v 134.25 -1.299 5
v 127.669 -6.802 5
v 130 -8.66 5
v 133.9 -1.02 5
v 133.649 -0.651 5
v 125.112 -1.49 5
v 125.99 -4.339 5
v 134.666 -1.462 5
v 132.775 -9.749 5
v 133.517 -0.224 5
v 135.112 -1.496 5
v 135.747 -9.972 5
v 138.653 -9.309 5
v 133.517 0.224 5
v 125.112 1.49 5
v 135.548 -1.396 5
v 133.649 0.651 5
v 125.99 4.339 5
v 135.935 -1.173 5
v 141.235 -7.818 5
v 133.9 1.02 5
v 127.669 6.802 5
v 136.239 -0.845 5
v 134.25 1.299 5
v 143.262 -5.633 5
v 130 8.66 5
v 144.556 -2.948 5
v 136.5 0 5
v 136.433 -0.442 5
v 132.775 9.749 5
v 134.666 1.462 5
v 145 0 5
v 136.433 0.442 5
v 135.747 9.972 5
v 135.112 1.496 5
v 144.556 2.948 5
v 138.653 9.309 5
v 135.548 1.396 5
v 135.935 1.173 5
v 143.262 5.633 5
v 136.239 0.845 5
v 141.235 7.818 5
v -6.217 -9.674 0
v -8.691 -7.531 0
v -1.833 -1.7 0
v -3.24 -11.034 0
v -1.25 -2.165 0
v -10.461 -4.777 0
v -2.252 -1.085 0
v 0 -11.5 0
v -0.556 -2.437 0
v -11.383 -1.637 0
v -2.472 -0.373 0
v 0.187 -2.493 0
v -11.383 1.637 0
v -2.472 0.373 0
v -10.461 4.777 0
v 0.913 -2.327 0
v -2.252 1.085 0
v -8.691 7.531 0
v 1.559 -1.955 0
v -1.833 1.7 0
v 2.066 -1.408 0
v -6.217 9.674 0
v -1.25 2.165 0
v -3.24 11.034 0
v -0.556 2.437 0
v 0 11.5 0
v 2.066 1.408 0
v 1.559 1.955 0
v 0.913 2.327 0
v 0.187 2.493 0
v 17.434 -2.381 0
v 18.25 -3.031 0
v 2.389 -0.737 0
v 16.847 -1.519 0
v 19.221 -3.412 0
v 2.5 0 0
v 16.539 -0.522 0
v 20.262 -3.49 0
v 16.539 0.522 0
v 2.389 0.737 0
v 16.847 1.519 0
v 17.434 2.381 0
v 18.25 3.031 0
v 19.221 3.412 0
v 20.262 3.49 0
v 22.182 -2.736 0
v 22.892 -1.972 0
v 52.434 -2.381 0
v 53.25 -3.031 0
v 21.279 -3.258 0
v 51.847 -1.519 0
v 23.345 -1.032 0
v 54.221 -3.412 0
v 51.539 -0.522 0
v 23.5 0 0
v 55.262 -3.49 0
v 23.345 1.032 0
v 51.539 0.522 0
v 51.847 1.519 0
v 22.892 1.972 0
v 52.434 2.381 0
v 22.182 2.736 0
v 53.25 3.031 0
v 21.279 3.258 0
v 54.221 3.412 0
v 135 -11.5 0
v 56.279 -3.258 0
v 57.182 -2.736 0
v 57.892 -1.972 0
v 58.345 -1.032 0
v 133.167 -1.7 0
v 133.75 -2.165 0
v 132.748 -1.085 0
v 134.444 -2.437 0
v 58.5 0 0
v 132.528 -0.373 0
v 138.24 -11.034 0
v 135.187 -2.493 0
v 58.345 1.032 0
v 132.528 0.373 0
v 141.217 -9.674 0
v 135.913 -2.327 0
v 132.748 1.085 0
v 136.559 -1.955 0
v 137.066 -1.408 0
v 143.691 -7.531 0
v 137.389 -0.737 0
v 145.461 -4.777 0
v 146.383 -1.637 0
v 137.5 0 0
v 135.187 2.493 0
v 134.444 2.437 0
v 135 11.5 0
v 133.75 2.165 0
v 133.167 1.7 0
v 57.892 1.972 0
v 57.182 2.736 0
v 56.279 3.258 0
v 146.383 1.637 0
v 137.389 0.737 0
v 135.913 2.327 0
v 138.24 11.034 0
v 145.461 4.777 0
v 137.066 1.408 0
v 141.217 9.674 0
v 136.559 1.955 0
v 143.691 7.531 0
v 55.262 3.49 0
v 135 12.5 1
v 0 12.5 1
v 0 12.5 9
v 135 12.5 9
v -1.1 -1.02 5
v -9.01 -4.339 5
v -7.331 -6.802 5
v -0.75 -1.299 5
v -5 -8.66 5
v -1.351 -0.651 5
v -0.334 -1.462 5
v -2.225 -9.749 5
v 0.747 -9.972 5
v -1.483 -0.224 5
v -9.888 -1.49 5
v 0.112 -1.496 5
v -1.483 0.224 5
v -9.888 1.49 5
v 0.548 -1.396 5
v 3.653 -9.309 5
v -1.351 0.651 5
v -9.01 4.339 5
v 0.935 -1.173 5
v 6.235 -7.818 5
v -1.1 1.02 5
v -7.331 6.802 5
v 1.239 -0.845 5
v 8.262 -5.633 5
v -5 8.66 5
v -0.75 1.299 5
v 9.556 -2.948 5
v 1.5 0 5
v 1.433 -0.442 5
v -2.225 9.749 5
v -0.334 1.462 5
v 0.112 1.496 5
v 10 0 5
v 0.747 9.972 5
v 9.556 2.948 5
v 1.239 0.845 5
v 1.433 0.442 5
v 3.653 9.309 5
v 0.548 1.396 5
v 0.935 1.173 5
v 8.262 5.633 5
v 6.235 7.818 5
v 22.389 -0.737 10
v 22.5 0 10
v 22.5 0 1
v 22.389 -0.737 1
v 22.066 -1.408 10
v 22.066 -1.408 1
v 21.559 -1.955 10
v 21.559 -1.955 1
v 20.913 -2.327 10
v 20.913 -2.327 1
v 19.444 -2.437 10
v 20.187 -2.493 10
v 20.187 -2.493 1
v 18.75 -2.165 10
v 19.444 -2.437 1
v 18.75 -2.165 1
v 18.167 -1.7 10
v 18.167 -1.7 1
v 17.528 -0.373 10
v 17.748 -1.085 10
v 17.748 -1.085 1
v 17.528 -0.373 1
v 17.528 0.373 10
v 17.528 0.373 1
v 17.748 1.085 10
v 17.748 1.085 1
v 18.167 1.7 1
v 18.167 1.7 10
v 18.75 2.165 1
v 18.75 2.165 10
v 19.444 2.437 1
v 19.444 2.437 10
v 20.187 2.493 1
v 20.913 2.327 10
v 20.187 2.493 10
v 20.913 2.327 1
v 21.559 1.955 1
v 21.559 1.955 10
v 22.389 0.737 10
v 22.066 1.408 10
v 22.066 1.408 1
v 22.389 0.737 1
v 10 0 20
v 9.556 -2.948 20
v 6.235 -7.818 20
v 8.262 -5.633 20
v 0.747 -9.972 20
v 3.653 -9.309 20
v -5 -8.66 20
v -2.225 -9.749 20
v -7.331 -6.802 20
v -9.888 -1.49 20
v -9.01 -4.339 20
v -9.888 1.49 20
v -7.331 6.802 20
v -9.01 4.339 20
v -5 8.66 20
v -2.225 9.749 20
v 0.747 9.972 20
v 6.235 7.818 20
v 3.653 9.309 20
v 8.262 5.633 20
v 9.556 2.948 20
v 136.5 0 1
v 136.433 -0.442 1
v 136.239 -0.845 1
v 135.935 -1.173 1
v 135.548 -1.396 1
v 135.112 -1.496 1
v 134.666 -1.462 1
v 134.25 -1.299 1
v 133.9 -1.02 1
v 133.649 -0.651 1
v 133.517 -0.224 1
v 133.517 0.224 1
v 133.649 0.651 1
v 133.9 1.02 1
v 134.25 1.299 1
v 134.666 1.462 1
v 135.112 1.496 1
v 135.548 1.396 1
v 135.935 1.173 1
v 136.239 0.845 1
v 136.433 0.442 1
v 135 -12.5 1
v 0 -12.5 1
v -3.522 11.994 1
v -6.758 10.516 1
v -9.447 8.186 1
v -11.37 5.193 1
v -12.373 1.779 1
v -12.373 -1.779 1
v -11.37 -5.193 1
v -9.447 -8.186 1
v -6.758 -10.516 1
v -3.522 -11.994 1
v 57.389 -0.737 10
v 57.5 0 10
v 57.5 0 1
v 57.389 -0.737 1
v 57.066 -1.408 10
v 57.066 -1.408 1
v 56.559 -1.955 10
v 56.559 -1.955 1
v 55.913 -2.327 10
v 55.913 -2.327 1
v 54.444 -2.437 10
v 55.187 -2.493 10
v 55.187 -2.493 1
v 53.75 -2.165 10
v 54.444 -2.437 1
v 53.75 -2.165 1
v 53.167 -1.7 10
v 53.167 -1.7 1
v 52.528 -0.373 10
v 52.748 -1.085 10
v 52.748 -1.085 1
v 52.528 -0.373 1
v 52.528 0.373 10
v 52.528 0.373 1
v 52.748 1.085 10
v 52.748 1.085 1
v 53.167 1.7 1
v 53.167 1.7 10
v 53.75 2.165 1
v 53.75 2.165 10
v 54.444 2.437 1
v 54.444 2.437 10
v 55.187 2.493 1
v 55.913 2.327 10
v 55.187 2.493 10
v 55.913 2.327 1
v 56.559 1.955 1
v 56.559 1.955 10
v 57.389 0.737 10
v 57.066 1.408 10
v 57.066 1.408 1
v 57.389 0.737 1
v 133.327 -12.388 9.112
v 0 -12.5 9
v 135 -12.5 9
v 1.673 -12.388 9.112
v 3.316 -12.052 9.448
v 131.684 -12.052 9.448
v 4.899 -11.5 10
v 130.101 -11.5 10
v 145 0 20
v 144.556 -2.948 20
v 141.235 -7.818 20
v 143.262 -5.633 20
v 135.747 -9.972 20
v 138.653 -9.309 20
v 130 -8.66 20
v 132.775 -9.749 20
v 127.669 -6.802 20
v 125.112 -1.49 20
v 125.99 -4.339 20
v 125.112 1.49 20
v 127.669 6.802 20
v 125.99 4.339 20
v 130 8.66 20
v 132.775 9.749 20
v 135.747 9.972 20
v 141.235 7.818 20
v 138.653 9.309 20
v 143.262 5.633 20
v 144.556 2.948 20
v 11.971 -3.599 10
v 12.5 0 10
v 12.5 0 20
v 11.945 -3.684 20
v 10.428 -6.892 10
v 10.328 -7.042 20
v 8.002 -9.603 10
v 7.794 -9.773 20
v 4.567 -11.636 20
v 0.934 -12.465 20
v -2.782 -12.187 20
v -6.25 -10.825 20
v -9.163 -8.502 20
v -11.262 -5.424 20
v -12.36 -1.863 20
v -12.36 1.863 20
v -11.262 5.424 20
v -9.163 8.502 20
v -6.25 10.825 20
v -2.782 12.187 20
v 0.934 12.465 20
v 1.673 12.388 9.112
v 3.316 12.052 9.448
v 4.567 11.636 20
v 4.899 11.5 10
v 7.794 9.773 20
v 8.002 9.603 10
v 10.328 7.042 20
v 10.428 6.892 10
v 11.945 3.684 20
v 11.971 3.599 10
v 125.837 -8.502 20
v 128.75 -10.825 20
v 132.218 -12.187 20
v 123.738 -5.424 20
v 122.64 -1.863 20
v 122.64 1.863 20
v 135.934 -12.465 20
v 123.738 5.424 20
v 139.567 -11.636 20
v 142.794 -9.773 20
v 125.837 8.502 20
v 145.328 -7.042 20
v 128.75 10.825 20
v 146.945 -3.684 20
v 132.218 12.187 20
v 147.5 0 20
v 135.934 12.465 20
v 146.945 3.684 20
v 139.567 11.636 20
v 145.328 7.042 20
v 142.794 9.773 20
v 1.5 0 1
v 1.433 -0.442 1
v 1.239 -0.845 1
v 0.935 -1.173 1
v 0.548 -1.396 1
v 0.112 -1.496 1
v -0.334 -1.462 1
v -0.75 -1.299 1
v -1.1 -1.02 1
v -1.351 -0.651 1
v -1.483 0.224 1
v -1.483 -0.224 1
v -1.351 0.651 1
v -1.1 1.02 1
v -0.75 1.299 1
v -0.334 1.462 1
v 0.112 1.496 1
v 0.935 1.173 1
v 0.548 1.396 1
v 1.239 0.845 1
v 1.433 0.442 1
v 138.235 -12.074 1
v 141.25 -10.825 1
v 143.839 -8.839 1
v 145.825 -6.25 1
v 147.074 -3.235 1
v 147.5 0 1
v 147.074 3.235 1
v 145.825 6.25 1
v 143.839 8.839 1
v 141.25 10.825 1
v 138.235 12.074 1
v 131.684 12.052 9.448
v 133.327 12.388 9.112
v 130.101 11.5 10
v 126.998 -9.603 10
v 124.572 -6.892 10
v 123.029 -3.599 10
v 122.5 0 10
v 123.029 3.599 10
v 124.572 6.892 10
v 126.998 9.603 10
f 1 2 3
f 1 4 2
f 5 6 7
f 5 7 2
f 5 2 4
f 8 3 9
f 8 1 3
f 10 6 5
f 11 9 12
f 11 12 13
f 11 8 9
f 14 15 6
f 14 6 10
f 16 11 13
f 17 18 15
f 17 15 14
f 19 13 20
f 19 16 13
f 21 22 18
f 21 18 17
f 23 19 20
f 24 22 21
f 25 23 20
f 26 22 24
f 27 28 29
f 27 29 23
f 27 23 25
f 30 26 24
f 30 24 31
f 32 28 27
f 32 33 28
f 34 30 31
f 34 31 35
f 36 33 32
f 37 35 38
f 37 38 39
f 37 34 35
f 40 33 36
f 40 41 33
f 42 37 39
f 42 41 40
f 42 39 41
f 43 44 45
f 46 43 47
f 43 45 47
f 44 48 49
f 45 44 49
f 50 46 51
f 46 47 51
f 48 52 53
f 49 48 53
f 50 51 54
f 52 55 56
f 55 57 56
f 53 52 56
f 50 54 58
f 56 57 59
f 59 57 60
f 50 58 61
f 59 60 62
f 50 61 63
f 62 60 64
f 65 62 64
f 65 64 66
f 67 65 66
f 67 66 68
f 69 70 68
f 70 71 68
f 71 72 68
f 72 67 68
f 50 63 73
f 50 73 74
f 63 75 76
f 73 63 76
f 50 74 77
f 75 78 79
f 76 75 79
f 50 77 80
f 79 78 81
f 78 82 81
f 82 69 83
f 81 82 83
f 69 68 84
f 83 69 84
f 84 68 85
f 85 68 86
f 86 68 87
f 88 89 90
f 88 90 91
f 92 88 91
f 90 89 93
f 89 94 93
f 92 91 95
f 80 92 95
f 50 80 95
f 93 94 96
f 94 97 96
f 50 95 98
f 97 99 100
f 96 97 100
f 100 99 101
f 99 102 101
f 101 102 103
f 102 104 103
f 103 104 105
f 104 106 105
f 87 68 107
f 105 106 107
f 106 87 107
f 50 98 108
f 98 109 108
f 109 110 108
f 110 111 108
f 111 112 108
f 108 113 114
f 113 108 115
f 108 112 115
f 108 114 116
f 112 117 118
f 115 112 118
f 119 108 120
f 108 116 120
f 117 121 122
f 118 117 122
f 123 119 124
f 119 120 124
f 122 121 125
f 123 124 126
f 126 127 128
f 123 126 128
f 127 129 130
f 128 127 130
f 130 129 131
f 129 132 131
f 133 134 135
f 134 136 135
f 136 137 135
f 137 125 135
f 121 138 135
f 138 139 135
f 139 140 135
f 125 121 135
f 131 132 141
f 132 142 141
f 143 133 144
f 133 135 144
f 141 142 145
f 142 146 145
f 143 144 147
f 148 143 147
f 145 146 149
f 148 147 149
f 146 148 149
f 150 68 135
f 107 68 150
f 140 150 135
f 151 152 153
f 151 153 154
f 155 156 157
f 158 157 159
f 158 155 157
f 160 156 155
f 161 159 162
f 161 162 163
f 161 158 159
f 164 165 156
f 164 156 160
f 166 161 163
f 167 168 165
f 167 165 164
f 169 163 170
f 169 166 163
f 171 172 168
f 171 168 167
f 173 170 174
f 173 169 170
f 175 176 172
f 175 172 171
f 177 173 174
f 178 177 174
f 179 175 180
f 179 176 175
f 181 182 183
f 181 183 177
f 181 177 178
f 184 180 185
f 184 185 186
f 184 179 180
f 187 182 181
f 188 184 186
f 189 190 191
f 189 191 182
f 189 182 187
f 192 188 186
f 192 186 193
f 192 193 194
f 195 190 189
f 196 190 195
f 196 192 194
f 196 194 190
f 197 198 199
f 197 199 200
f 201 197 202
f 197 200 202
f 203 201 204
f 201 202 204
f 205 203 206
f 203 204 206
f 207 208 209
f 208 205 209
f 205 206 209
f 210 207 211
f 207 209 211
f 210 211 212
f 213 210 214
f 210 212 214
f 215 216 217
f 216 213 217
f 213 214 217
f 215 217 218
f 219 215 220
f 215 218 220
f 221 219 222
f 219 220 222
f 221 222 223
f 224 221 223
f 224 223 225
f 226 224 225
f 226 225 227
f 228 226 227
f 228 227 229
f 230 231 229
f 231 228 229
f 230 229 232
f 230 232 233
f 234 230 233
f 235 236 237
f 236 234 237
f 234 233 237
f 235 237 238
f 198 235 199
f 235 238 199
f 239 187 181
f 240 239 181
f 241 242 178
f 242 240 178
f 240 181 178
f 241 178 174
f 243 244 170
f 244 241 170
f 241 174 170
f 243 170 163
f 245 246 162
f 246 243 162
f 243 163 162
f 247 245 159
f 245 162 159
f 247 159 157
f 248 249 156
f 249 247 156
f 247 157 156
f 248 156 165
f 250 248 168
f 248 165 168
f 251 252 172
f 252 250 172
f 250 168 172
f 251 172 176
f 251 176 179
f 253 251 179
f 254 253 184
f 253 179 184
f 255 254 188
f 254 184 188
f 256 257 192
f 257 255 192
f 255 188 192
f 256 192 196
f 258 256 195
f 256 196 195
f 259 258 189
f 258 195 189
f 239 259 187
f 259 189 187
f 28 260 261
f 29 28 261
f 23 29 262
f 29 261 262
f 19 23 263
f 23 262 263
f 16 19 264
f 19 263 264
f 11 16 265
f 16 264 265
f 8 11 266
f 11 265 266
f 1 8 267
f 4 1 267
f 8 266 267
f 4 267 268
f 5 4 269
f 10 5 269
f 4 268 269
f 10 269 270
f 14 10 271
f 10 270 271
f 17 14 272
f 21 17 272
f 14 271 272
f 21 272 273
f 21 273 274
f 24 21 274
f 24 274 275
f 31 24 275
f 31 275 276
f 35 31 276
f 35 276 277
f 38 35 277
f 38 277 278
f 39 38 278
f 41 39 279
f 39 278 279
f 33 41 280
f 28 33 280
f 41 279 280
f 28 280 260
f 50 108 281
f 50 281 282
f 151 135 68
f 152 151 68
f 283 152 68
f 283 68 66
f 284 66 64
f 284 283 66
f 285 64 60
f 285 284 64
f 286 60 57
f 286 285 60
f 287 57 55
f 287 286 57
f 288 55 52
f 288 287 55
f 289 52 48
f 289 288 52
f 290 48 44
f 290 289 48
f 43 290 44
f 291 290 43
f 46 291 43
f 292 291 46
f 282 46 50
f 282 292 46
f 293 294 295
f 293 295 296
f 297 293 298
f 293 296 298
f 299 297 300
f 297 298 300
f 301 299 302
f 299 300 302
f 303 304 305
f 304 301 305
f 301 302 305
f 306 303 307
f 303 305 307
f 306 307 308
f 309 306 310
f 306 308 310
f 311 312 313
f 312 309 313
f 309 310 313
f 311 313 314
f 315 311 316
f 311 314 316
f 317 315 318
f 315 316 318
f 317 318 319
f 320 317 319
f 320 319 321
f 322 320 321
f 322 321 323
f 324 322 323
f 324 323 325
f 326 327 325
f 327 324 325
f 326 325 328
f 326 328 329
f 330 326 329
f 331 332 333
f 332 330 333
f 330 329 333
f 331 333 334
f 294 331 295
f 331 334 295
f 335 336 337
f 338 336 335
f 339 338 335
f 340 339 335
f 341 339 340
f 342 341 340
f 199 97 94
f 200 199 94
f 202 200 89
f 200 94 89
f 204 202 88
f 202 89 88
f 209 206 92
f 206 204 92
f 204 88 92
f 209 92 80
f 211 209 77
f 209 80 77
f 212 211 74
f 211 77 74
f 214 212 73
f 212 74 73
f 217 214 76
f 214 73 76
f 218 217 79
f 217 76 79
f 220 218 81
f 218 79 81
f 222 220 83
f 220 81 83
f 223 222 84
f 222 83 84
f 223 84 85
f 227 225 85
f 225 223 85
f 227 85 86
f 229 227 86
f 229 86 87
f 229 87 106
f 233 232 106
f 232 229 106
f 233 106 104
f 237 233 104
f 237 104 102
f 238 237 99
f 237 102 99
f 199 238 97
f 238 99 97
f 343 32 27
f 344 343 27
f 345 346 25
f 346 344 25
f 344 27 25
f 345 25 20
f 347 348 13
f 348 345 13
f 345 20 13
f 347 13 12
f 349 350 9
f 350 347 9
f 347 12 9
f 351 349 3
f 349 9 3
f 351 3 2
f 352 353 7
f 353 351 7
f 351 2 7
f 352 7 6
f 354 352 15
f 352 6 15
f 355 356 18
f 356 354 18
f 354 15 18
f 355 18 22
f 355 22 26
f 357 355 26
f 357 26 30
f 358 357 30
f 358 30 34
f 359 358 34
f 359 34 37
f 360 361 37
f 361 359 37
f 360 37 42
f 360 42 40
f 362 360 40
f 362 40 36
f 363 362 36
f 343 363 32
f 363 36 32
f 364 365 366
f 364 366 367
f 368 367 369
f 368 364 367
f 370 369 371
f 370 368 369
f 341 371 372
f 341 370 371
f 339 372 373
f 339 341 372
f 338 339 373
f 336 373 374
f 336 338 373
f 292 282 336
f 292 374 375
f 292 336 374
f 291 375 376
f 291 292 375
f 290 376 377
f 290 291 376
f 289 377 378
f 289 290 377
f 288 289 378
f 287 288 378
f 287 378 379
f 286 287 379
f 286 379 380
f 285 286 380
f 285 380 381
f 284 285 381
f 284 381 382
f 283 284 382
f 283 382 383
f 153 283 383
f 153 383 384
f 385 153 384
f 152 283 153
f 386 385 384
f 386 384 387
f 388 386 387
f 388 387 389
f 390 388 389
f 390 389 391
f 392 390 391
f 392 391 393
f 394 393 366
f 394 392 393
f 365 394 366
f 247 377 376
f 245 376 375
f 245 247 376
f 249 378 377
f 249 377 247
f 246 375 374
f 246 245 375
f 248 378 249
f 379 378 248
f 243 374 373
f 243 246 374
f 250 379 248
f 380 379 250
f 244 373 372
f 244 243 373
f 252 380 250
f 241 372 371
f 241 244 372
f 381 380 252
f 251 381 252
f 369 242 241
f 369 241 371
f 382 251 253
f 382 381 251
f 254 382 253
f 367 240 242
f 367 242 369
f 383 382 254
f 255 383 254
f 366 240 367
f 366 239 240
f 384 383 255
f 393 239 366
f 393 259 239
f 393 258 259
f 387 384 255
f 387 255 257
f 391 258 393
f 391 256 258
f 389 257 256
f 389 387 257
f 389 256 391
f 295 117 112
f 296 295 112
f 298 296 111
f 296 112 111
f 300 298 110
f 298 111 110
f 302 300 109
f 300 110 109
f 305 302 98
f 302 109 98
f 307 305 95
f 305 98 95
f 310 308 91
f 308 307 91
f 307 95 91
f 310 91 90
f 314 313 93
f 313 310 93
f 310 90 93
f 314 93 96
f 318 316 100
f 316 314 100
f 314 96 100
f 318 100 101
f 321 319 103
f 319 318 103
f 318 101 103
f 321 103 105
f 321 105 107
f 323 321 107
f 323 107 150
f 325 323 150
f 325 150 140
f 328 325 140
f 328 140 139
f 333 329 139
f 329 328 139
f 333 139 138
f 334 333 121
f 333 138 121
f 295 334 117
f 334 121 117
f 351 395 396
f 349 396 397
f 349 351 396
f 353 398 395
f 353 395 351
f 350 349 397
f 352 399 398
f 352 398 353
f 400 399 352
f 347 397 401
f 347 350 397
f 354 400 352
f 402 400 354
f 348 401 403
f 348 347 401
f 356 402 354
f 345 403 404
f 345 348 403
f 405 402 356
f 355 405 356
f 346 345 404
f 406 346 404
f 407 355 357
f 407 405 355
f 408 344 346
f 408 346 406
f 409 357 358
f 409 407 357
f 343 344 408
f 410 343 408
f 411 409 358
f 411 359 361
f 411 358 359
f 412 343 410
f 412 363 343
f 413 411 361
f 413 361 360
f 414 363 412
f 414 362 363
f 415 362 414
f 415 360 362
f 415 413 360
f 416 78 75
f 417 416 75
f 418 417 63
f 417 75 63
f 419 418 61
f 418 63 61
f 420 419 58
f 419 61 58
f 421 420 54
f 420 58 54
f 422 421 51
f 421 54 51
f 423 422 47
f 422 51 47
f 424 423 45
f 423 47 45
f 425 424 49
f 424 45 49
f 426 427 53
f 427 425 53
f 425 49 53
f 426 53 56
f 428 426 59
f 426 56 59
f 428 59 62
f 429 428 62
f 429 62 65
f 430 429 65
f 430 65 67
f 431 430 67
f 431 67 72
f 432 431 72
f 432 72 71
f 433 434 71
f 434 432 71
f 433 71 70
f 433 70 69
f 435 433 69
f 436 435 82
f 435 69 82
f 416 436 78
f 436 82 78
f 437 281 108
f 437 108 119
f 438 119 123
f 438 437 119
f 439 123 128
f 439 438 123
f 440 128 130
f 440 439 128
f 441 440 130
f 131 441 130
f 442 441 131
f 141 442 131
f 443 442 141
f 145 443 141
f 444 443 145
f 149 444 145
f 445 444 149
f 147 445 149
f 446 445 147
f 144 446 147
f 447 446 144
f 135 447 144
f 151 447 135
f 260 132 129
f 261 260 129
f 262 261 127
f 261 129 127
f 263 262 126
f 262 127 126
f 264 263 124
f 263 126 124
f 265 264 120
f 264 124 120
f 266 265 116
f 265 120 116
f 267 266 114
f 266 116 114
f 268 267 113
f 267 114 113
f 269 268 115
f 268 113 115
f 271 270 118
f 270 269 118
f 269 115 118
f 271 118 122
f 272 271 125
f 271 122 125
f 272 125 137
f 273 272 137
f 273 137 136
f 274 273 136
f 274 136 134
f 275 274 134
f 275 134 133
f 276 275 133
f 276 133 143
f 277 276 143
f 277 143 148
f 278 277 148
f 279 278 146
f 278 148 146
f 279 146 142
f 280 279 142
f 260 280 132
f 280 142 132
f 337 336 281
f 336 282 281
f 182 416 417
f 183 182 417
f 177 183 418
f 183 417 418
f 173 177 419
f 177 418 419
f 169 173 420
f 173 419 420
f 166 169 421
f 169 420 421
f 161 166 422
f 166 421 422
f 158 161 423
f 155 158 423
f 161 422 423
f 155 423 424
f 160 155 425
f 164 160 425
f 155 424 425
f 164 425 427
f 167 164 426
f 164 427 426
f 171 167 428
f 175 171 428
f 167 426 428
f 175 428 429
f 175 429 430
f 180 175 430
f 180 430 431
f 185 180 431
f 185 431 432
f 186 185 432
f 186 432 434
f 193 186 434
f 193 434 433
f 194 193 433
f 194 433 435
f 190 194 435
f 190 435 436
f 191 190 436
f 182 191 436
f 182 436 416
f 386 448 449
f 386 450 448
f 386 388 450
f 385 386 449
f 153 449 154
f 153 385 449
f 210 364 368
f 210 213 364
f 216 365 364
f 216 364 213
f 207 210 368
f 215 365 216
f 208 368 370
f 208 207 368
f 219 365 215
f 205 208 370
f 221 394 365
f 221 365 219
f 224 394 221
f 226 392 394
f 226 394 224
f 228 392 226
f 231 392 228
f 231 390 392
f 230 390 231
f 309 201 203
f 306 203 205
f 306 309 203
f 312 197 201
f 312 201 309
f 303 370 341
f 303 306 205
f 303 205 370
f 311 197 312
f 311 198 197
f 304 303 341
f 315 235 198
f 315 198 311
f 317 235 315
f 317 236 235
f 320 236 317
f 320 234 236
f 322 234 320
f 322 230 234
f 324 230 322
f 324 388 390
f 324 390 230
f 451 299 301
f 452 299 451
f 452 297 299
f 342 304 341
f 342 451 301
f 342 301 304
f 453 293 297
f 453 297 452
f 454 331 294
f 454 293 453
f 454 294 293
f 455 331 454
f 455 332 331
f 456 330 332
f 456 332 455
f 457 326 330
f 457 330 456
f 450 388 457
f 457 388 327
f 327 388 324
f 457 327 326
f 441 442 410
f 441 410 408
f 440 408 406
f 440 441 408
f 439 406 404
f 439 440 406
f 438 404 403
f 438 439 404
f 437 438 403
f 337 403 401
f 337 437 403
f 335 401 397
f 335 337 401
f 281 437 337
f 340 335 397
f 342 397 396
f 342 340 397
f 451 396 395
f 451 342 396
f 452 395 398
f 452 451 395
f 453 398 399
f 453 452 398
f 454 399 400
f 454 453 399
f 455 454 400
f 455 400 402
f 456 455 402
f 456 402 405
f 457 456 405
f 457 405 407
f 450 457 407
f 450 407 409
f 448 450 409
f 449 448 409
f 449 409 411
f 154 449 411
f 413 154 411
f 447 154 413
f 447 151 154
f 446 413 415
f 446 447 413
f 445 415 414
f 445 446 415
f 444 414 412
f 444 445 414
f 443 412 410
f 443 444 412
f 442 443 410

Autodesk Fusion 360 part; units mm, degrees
sketch "Sketch1" plane through (0, 0, 0) normal (0, 0, 1) x (1, 0, 0)
  circle A0 centre (0, 0) radius 10
  circle A1 centre (0, 0) radius 12.5
  line L0 (0, 0) -> (135, 0) construction
  circle A2 centre (135, 0) radius 10
  circle A3 centre (135, 0) radius 12.5
  line L1 (0, 12.5) -> (135, 12.5)
  line L2 (0, -12.5) -> (135, -12.5)
  circle A4 centre (20, 0) radius 2.5
  circle A5 centre (55, 0) radius 2.5
  circle A6 centre (0, 0) radius 1.5
  circle A7 centre (135, 0) radius 1.5
  dimension "d1" = 20
  dimension "d2" = 25
  dimension "d3" = 20
  dimension "d5" = 135
  dimension "d6" = 5
  dimension "d7" = 5
  dimension "d8" = 35
  dimension "d9" = 20
  dimension "d16" = 3
  dimension "d17" = 3
extrude "Extrude1" add sketch "Sketch1" along normal blind 10 contours A1 A3 L1 L2 makes body 1
extrude "Extrude2" add sketch "Sketch1" along normal blind 5 separate body contours A0 | A2 | A6 | A7 makes body 2 at (9.9876, -0.4985, 3.3333) makes body 3 at (131.9968, 2.3092, 0)
extrude "Extrude3" add sketch "Sketch1" along normal blind 20 contours A1 | A3 bodies 1 2 3
extrude "Extrude4" cut sketch "Sketch1" along normal through all contours A6 | A7 bodies 1
chamfer "Chamfer1" distance 1 angle 45 1 faces at (108.6406, -4.5163, 0) on bodies 1
chamfer "Chamfer2" distance 1 angle 45 2 edges at (67.5, 12.5, 10) (67.5, -12.5, 10) on bodies 1
